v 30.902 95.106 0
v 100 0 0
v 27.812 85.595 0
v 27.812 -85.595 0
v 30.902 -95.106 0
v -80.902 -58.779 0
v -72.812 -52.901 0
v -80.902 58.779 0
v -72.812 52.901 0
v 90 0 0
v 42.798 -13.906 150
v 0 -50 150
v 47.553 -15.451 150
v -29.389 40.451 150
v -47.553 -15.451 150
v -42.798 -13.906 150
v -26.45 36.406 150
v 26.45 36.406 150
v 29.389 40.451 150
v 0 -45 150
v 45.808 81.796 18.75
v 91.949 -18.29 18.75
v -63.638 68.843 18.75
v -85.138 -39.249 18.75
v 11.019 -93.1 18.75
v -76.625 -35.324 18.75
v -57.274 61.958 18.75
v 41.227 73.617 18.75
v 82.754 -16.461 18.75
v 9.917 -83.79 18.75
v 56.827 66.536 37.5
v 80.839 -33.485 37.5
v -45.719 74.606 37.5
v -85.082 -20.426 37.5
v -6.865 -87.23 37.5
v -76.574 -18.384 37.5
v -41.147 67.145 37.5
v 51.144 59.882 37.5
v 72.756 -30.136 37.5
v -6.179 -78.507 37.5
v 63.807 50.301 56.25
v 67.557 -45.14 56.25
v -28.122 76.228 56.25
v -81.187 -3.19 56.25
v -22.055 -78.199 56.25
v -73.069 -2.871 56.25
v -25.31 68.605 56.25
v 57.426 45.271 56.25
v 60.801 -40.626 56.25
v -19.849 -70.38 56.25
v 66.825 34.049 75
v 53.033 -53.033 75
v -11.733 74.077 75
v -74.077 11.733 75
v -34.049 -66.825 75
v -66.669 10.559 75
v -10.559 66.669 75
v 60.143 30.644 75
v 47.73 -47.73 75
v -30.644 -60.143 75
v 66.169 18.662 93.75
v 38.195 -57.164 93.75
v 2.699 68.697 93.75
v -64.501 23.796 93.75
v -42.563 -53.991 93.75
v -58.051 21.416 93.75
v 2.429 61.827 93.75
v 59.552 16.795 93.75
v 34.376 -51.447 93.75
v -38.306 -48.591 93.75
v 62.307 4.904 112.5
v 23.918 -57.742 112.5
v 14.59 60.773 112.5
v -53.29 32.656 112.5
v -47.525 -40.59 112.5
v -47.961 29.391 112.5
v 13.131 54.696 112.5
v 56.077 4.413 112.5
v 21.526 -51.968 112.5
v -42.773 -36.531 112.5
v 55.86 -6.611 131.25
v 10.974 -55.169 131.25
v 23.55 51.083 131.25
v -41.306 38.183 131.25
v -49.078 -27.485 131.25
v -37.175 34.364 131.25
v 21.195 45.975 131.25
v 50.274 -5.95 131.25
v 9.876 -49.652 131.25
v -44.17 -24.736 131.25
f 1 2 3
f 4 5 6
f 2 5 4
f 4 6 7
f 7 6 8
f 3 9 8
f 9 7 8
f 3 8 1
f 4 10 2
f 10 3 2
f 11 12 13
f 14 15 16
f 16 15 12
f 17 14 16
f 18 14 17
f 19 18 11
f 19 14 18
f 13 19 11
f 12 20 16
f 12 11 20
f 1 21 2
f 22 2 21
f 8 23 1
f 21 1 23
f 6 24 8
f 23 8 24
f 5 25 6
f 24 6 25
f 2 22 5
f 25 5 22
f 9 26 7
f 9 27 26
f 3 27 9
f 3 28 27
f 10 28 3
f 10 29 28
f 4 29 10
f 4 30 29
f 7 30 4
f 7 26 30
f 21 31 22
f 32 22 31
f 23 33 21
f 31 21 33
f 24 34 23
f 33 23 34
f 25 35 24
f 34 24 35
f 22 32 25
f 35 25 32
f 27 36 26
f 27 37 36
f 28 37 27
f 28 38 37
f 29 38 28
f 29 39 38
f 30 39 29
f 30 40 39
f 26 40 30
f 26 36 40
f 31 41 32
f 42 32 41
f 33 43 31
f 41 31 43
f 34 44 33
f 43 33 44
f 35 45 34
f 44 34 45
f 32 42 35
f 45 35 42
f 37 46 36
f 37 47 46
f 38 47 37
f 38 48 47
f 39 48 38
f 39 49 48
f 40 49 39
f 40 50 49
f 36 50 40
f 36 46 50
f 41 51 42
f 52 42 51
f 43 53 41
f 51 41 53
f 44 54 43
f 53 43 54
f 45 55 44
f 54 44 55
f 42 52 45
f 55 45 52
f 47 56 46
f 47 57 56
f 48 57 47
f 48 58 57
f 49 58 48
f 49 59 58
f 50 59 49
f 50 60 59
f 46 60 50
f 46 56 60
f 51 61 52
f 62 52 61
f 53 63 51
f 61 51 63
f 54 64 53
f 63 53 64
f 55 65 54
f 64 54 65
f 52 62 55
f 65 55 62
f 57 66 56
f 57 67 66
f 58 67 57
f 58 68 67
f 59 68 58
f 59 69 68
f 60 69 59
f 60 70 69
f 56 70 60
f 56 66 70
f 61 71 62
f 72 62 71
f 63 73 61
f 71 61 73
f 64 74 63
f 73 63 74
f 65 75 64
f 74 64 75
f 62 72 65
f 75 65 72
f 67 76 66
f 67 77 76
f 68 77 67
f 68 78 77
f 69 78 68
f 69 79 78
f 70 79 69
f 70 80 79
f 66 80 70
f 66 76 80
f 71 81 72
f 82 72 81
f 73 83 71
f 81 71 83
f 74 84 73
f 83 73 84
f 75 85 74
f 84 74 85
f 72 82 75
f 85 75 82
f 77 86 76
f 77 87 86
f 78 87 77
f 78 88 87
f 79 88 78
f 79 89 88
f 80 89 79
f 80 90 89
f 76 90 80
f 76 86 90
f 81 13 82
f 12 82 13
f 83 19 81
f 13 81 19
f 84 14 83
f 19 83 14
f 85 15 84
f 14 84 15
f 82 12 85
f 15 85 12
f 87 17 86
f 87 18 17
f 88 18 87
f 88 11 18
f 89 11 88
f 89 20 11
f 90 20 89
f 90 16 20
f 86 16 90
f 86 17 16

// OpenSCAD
radius = 100; 

linear_extrude(height=radius*1.5, scale=0.5, twist=90) {
    difference() { 
        circle(r=radius, $fn=5);
        circle(r=radius-10, $fn=5);
    }
    // for (deg=[0:360/5:360]) {
    //     rotate([0,0,deg]) {
    //         translate([100, 0, 0]) {
    //             circle(r=radius/2, $fn=3);
    //         }
    //     }
    // } 
}
